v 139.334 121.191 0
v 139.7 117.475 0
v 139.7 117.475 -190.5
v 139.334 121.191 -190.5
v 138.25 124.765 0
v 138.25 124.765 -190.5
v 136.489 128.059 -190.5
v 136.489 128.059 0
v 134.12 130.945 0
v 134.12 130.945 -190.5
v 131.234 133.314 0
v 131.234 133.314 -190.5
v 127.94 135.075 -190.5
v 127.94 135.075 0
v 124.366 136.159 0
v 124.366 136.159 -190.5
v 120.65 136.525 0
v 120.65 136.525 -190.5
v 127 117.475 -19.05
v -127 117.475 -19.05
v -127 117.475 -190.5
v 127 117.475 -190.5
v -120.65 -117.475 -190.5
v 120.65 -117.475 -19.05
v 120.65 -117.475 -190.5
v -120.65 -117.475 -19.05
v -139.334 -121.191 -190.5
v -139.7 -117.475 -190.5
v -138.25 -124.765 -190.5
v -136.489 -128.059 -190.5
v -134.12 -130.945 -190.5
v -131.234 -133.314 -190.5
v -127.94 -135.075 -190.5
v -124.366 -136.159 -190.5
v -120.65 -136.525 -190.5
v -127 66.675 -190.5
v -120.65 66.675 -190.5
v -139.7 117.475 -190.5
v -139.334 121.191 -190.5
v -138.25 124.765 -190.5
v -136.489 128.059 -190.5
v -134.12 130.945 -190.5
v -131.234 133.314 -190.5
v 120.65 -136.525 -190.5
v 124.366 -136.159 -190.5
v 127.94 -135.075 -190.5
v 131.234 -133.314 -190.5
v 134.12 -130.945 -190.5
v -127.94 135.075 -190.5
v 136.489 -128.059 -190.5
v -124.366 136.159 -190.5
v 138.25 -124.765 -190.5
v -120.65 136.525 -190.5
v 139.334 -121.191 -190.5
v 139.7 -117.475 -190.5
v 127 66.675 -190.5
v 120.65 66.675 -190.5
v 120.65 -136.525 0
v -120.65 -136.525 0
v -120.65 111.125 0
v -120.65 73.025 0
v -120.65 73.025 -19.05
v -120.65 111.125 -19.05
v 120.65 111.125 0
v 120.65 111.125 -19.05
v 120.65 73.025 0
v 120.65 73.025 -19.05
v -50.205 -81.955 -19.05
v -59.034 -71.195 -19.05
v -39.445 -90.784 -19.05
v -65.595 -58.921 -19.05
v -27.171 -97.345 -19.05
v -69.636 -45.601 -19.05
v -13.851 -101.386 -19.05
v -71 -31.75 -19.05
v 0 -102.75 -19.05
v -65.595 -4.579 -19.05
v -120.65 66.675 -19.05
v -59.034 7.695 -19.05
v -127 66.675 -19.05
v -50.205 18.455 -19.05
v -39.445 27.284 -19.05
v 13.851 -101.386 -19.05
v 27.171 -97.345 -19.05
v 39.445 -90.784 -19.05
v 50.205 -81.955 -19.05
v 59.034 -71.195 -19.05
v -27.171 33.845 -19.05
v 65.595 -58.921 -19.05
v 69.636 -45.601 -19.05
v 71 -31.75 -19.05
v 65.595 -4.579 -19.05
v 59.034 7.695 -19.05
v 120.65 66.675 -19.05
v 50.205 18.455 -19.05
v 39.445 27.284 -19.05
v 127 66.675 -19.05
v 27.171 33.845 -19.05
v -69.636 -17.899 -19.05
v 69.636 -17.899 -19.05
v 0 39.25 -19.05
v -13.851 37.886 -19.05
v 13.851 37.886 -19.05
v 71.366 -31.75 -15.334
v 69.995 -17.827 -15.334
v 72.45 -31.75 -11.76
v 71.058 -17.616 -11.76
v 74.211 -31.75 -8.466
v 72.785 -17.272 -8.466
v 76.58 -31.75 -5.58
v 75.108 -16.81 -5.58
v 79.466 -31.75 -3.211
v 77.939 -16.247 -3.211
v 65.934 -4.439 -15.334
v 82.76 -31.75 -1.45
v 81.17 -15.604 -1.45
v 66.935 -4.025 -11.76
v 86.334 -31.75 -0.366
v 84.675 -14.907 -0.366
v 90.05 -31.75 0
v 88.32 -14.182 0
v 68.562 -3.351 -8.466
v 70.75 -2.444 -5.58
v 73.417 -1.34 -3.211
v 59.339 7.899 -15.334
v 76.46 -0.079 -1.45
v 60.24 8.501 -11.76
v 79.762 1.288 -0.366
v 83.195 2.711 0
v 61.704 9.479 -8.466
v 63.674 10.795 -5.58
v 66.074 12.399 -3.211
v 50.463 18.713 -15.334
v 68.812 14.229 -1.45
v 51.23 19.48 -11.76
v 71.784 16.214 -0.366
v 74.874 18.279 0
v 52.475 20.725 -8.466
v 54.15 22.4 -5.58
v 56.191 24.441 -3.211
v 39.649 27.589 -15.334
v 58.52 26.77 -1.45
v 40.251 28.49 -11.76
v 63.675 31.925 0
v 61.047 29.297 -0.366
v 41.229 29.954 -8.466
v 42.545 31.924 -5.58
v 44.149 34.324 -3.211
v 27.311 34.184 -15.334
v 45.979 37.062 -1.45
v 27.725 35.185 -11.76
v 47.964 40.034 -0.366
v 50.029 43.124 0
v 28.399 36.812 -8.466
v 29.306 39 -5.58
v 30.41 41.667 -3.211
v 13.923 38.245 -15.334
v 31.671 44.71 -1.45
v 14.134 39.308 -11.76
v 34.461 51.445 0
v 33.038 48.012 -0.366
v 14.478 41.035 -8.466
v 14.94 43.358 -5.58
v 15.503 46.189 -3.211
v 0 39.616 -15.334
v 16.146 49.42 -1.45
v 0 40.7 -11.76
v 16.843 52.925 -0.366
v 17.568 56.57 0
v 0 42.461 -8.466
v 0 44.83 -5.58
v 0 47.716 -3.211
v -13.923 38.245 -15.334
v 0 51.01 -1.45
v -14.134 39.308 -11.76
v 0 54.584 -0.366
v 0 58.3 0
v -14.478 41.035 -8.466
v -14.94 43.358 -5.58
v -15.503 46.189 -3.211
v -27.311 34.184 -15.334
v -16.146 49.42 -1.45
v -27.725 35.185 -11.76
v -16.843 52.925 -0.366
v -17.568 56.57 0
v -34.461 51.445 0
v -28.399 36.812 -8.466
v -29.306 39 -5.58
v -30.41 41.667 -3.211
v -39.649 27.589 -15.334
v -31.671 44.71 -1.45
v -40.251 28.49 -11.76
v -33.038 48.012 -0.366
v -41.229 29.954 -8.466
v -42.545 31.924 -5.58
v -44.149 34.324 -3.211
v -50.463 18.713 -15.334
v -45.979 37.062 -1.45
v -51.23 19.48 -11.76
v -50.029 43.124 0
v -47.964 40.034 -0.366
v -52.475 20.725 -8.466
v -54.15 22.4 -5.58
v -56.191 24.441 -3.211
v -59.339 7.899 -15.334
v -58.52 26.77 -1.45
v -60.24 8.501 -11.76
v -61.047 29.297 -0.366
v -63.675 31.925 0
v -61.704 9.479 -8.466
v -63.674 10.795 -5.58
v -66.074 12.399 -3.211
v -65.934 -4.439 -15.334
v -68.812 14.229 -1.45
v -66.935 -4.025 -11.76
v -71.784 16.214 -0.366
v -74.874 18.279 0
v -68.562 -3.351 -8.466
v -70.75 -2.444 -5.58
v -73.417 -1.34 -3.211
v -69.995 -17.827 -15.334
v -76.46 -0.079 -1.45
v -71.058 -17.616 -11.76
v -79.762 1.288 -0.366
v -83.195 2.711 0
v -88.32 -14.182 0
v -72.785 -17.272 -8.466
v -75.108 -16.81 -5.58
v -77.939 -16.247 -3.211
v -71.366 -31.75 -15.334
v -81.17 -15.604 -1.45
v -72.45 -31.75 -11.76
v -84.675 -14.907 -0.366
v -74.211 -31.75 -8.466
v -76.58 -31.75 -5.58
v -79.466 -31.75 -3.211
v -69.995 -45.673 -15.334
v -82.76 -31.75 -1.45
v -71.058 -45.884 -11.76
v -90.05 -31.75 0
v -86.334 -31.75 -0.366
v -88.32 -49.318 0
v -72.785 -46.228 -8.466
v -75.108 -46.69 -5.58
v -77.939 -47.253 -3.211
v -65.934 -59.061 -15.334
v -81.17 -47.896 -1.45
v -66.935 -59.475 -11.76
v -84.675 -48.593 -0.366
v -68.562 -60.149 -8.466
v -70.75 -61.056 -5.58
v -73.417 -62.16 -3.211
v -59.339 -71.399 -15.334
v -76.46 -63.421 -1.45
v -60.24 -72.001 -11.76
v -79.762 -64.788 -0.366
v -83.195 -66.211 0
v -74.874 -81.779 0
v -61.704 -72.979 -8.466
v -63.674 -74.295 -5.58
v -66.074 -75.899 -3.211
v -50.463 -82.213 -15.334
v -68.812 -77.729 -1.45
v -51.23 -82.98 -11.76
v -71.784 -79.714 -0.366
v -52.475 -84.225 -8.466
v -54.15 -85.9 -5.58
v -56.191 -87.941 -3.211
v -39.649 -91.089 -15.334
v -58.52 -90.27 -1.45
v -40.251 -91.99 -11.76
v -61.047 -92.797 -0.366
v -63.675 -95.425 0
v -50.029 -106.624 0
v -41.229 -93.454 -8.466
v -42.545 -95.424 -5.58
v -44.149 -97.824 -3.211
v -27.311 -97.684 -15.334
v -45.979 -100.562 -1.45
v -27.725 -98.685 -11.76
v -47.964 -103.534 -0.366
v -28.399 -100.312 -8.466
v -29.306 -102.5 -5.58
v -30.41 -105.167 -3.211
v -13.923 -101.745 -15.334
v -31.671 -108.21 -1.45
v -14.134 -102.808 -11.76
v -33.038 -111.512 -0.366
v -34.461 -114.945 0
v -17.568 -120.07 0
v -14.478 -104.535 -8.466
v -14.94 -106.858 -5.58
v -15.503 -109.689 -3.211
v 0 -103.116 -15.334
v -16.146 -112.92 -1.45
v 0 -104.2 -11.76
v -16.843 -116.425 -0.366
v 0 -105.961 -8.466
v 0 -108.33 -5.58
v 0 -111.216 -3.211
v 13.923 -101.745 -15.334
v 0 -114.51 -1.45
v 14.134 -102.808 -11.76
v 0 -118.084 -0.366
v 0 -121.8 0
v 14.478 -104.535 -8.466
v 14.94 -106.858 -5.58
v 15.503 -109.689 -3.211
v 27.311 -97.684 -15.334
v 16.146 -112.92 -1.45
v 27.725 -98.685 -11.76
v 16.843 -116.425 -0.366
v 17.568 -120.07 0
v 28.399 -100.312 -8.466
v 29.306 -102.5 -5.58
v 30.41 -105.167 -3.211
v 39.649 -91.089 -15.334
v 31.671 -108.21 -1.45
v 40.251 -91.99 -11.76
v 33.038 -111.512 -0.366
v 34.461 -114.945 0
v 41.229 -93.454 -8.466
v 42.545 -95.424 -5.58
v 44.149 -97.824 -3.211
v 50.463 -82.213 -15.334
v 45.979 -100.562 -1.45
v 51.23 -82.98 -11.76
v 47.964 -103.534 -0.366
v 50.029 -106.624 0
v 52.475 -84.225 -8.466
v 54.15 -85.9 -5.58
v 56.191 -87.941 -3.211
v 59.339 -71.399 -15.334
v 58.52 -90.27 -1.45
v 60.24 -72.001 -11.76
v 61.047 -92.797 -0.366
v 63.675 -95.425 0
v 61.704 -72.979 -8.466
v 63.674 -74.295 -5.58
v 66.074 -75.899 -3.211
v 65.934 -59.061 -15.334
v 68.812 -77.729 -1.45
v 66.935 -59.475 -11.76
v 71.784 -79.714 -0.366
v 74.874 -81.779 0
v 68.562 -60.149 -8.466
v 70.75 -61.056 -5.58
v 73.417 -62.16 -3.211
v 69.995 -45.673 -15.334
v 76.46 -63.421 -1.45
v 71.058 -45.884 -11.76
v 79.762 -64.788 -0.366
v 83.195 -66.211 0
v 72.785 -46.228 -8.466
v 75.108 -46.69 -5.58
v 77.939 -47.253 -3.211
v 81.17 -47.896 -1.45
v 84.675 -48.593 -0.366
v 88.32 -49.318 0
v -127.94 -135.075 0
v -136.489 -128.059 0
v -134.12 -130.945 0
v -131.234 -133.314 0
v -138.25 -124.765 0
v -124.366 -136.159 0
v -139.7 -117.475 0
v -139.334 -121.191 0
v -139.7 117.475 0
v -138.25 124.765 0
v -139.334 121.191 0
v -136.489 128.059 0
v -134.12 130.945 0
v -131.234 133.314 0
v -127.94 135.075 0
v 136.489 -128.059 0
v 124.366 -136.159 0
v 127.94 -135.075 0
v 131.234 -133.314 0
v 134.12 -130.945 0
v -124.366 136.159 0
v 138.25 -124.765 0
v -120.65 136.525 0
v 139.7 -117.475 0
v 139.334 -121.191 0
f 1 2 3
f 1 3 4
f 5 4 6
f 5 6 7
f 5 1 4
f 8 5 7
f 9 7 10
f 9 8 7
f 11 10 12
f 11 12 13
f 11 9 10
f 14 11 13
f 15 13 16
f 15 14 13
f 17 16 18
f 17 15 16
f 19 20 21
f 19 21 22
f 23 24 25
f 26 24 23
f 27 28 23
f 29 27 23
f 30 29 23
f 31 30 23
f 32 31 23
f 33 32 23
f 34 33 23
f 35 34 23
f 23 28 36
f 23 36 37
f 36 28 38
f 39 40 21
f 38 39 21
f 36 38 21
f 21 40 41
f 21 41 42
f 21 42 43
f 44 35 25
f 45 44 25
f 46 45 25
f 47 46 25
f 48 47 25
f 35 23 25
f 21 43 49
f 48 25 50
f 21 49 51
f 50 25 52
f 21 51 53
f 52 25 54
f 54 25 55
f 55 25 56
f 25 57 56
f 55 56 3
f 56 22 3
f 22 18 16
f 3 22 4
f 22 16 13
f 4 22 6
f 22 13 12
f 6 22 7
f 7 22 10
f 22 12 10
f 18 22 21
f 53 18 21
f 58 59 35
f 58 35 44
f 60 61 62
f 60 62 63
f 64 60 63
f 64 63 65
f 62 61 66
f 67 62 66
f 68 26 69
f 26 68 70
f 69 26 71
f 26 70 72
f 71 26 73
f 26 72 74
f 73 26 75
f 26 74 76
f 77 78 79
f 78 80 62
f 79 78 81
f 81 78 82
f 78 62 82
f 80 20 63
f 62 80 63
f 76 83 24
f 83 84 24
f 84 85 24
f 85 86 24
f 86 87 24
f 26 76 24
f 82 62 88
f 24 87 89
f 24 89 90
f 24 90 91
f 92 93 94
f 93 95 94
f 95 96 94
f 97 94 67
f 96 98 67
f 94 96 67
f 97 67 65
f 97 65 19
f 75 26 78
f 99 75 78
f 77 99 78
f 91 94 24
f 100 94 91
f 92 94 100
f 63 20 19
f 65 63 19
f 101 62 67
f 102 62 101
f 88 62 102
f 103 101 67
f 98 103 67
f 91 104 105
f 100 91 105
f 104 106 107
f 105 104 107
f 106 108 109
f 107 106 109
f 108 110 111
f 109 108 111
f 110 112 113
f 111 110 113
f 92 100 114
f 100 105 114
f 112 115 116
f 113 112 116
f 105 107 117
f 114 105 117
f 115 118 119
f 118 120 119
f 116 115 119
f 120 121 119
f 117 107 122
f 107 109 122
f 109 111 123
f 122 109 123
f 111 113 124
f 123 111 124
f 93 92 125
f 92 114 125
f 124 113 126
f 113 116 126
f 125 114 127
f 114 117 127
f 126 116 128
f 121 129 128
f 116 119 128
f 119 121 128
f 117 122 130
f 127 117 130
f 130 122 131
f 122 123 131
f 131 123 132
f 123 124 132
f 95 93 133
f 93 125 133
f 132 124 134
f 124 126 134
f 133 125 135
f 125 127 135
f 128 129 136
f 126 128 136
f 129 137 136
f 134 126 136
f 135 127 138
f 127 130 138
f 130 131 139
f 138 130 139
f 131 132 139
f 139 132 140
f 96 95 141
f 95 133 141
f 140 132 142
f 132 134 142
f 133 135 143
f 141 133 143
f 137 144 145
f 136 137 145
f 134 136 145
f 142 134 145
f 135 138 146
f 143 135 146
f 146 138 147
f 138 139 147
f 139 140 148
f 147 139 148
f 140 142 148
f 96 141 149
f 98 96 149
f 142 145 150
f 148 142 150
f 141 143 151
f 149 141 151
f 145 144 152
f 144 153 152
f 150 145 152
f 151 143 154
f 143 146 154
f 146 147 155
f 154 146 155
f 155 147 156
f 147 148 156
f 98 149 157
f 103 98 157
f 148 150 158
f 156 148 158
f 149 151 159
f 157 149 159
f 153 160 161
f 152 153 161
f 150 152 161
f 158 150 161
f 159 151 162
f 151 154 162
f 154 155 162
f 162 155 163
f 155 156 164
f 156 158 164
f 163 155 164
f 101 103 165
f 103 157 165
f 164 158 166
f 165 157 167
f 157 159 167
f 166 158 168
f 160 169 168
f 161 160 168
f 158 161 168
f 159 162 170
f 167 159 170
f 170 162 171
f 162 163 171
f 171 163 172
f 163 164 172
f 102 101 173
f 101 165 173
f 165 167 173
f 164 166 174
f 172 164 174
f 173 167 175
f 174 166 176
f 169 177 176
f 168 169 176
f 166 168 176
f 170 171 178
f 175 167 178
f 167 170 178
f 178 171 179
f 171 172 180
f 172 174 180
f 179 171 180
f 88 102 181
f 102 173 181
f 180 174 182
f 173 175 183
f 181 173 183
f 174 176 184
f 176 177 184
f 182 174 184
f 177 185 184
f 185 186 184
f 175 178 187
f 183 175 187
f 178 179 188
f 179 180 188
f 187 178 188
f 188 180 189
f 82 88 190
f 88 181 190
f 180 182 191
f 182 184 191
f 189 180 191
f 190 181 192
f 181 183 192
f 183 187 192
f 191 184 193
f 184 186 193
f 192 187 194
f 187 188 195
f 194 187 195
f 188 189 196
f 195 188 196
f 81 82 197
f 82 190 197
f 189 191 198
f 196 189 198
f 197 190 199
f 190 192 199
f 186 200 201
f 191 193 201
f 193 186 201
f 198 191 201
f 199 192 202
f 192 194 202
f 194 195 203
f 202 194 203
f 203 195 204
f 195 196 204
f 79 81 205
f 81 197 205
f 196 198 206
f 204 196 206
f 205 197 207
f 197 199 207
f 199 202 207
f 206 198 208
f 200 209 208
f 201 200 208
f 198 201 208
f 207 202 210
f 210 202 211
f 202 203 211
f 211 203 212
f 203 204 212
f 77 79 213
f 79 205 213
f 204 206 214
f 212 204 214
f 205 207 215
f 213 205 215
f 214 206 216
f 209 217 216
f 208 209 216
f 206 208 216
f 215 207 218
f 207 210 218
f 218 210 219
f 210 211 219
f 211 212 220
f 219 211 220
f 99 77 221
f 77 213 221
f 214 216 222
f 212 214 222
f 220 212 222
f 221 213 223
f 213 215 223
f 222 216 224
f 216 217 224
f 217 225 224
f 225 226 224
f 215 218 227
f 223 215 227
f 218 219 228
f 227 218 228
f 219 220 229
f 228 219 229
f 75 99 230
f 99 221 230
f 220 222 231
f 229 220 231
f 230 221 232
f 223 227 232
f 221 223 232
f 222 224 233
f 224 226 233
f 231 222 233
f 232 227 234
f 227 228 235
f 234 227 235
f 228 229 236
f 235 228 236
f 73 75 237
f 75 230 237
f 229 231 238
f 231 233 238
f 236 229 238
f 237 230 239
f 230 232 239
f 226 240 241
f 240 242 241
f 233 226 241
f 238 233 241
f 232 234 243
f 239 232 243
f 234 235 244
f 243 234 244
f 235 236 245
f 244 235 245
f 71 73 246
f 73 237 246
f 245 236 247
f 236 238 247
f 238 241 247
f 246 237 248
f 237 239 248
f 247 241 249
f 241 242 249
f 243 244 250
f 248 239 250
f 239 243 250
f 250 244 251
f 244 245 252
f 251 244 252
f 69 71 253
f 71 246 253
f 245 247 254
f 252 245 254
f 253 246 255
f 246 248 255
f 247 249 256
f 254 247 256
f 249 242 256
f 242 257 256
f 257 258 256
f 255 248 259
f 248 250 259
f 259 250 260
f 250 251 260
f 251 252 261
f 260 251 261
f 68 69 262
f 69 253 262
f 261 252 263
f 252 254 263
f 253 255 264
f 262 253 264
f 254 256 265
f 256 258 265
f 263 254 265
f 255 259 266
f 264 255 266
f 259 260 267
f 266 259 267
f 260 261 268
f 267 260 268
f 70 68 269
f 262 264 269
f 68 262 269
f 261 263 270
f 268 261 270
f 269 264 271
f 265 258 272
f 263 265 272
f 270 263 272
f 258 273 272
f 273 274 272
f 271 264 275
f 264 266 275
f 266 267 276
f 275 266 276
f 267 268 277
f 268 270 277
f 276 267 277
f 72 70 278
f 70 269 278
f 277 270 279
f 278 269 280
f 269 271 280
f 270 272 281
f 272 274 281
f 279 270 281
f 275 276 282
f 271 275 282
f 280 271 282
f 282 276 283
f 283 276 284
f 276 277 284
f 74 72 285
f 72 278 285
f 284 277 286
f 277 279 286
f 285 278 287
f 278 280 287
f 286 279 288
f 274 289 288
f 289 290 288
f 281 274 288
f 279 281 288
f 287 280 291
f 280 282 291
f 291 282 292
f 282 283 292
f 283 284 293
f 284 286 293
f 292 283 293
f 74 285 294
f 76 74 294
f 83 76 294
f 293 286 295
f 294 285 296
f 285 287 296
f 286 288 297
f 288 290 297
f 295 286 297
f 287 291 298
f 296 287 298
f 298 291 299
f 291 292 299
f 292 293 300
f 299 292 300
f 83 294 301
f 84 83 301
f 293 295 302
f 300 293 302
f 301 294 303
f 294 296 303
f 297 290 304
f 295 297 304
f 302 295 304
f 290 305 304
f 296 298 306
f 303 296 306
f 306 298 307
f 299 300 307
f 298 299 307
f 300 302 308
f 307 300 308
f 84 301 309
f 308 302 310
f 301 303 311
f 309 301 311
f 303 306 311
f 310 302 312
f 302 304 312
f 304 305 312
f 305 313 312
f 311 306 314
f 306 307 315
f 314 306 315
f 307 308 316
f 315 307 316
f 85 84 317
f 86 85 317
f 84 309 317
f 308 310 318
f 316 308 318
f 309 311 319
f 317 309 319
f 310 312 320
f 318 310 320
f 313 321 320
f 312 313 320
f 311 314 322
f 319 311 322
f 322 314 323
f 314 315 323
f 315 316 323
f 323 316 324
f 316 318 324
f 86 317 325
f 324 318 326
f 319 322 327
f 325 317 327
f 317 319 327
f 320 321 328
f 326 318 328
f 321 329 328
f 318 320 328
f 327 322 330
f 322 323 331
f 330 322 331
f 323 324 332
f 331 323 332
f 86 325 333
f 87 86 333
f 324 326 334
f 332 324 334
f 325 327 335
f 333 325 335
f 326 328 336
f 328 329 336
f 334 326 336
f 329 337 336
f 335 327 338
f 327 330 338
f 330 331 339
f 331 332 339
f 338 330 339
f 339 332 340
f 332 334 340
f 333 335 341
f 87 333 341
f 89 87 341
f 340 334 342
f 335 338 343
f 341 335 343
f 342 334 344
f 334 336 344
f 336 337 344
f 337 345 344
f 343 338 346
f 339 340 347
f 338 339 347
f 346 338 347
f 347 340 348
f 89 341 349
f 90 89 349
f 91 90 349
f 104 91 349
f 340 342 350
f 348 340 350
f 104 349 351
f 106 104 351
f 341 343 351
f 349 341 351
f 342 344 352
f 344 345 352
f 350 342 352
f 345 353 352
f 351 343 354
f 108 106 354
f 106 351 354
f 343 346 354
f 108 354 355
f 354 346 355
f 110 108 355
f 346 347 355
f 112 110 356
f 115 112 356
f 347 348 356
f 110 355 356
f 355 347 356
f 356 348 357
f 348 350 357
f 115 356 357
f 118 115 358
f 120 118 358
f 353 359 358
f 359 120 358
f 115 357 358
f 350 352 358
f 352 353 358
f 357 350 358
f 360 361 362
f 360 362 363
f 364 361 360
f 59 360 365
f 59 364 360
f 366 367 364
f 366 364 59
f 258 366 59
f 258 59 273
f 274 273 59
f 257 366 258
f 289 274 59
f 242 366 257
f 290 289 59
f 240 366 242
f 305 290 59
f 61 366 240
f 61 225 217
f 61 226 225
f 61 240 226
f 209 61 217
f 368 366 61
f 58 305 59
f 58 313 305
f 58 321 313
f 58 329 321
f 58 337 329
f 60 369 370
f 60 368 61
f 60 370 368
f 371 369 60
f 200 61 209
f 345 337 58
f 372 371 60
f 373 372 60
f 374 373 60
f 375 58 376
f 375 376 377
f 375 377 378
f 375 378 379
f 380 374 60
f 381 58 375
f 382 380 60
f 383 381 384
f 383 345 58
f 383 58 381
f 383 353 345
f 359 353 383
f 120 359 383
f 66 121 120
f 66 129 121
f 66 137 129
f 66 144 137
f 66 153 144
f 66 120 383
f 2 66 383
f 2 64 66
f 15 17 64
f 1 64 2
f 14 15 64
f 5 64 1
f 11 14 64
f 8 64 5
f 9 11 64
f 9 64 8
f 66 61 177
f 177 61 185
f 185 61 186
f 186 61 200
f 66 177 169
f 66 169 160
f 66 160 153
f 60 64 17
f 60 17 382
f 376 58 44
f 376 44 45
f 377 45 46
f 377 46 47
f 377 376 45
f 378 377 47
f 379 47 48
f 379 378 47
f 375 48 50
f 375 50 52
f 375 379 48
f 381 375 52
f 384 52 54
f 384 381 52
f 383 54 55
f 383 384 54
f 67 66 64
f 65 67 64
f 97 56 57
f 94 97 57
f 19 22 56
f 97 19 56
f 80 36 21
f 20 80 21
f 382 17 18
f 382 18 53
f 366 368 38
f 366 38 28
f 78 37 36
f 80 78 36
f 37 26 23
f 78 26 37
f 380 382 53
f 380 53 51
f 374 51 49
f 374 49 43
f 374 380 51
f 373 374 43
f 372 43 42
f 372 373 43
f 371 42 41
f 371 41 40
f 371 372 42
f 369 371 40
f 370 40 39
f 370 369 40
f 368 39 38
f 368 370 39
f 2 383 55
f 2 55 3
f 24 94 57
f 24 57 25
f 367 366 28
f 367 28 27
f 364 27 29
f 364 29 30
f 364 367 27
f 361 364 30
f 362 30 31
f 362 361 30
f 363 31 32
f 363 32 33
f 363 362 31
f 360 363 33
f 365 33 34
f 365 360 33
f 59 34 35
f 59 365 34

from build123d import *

# Parameters (mm, degrees)
F1_DEPTH = 190.5
F2_W     = 50.8
F2_H     = 19.05
F3_DEPTH = 6.35
F4_W     = 50.8
F4_H     = 19.05
F5_DEPTH = 6.35
F0_W     = 241.3
F0_H     = 184.15
F0_R     = 71
F0_H_2   = 38.1
F6_DEPTH = 19.05
F7_R     = 19.04999


# Not quite as in the source:
# - a fillet or chamfer is up to 0.001 mm smaller than in the source, because OpenCascade refuses the exact size


with BuildPart() as f1:
    # F0 (on Top) → F1 (new body)
    with BuildSketch(Plane.XY):
        with BuildLine():
            Line((-120.65, -136.525), (120.65, -136.525))
            ThreePointArc((120.65, -136.525), (134.1203841816, -130.9453841816), (139.7, -117.475))
            Line((139.7, -117.475), (139.7, 117.475))
            Line((139.7, 117.475), (127, 117.475))
            Line((127, 117.475), (127, 66.675))
            Line((127, 66.675), (120.65, 66.675))
            Line((120.65, 66.675), (120.65, -117.475))
            Line((120.65, -117.475), (-120.65, -117.475))
            Line((-120.65, -117.475), (-120.65, 66.675))
            Line((-120.65, 66.675), (-127, 66.675))
            Line((-127, 66.675), (-127, 117.475))
            Line((-127, 117.475), (-139.7, 117.475))
            Line((-139.7, 117.475), (-139.7, -117.475))
            ThreePointArc((-139.7, -117.475), (-134.1203841816, -130.9453841816), (-120.65, -136.525))
        make_face()
        with BuildLine():
            Line((127, 117.475), (139.7, 117.475))
            ThreePointArc((139.7, 117.475), (134.1203841816, 130.9453841816), (120.65, 136.525))
            Line((120.65, 136.525), (-120.65, 136.525))
            ThreePointArc((-120.65, 136.525), (-134.1203841816, 130.9453841816), (-139.7, 117.475))
            Line((-139.7, 117.475), (-127, 117.475))
            Line((-127, 117.475), (127, 117.475))
        make_face()
    extrude(amount=-F1_DEPTH)

    # F2 (on face) → F3 (join)
    with BuildSketch(Plane(origin=(127, 0, 0), x_dir=(0, -1, 0), z_dir=(-1, 0, 0))):
        with Locations((-92.075, -9.525)):
            Rectangle(F2_W, F2_H)
    extrude(amount=F3_DEPTH)

    # F4 (on face) → F5 (join)
    with BuildSketch(Plane.YZ.offset(-127)):
        with Locations((92.075, -9.525)):
            Rectangle(F4_W, F4_H)
    extrude(amount=F5_DEPTH)

    # F0 (on Top) → F6 (join)
    with BuildSketch(Plane.XY):
        with Locations((0, -25.4)):
            Rectangle(F0_W, F0_H)
        with Locations((0, -31.75)):
            Circle(F0_R, mode=Mode.SUBTRACT)
        Polygon((127, 66.675), (127, 117.475), (-127, 117.475), (-127, 66.675), (-120.65, 66.675), (120.65, 66.675), align=None)
        with Locations((0, 92.075)):
            Rectangle(F0_W, F0_H_2, mode=Mode.SUBTRACT)
    extrude(amount=-F6_DEPTH)

    # F7 (radius 19.05 in the source; OpenCascade refuses exactly that, so slightly less here)
    f7_edges = [f1.edges().sort_by_distance(p)[0] for p in [
        (-71, -31.75, 0),
    ]]
    fillet(f7_edges, radius=F7_R)


solid = f1.part
